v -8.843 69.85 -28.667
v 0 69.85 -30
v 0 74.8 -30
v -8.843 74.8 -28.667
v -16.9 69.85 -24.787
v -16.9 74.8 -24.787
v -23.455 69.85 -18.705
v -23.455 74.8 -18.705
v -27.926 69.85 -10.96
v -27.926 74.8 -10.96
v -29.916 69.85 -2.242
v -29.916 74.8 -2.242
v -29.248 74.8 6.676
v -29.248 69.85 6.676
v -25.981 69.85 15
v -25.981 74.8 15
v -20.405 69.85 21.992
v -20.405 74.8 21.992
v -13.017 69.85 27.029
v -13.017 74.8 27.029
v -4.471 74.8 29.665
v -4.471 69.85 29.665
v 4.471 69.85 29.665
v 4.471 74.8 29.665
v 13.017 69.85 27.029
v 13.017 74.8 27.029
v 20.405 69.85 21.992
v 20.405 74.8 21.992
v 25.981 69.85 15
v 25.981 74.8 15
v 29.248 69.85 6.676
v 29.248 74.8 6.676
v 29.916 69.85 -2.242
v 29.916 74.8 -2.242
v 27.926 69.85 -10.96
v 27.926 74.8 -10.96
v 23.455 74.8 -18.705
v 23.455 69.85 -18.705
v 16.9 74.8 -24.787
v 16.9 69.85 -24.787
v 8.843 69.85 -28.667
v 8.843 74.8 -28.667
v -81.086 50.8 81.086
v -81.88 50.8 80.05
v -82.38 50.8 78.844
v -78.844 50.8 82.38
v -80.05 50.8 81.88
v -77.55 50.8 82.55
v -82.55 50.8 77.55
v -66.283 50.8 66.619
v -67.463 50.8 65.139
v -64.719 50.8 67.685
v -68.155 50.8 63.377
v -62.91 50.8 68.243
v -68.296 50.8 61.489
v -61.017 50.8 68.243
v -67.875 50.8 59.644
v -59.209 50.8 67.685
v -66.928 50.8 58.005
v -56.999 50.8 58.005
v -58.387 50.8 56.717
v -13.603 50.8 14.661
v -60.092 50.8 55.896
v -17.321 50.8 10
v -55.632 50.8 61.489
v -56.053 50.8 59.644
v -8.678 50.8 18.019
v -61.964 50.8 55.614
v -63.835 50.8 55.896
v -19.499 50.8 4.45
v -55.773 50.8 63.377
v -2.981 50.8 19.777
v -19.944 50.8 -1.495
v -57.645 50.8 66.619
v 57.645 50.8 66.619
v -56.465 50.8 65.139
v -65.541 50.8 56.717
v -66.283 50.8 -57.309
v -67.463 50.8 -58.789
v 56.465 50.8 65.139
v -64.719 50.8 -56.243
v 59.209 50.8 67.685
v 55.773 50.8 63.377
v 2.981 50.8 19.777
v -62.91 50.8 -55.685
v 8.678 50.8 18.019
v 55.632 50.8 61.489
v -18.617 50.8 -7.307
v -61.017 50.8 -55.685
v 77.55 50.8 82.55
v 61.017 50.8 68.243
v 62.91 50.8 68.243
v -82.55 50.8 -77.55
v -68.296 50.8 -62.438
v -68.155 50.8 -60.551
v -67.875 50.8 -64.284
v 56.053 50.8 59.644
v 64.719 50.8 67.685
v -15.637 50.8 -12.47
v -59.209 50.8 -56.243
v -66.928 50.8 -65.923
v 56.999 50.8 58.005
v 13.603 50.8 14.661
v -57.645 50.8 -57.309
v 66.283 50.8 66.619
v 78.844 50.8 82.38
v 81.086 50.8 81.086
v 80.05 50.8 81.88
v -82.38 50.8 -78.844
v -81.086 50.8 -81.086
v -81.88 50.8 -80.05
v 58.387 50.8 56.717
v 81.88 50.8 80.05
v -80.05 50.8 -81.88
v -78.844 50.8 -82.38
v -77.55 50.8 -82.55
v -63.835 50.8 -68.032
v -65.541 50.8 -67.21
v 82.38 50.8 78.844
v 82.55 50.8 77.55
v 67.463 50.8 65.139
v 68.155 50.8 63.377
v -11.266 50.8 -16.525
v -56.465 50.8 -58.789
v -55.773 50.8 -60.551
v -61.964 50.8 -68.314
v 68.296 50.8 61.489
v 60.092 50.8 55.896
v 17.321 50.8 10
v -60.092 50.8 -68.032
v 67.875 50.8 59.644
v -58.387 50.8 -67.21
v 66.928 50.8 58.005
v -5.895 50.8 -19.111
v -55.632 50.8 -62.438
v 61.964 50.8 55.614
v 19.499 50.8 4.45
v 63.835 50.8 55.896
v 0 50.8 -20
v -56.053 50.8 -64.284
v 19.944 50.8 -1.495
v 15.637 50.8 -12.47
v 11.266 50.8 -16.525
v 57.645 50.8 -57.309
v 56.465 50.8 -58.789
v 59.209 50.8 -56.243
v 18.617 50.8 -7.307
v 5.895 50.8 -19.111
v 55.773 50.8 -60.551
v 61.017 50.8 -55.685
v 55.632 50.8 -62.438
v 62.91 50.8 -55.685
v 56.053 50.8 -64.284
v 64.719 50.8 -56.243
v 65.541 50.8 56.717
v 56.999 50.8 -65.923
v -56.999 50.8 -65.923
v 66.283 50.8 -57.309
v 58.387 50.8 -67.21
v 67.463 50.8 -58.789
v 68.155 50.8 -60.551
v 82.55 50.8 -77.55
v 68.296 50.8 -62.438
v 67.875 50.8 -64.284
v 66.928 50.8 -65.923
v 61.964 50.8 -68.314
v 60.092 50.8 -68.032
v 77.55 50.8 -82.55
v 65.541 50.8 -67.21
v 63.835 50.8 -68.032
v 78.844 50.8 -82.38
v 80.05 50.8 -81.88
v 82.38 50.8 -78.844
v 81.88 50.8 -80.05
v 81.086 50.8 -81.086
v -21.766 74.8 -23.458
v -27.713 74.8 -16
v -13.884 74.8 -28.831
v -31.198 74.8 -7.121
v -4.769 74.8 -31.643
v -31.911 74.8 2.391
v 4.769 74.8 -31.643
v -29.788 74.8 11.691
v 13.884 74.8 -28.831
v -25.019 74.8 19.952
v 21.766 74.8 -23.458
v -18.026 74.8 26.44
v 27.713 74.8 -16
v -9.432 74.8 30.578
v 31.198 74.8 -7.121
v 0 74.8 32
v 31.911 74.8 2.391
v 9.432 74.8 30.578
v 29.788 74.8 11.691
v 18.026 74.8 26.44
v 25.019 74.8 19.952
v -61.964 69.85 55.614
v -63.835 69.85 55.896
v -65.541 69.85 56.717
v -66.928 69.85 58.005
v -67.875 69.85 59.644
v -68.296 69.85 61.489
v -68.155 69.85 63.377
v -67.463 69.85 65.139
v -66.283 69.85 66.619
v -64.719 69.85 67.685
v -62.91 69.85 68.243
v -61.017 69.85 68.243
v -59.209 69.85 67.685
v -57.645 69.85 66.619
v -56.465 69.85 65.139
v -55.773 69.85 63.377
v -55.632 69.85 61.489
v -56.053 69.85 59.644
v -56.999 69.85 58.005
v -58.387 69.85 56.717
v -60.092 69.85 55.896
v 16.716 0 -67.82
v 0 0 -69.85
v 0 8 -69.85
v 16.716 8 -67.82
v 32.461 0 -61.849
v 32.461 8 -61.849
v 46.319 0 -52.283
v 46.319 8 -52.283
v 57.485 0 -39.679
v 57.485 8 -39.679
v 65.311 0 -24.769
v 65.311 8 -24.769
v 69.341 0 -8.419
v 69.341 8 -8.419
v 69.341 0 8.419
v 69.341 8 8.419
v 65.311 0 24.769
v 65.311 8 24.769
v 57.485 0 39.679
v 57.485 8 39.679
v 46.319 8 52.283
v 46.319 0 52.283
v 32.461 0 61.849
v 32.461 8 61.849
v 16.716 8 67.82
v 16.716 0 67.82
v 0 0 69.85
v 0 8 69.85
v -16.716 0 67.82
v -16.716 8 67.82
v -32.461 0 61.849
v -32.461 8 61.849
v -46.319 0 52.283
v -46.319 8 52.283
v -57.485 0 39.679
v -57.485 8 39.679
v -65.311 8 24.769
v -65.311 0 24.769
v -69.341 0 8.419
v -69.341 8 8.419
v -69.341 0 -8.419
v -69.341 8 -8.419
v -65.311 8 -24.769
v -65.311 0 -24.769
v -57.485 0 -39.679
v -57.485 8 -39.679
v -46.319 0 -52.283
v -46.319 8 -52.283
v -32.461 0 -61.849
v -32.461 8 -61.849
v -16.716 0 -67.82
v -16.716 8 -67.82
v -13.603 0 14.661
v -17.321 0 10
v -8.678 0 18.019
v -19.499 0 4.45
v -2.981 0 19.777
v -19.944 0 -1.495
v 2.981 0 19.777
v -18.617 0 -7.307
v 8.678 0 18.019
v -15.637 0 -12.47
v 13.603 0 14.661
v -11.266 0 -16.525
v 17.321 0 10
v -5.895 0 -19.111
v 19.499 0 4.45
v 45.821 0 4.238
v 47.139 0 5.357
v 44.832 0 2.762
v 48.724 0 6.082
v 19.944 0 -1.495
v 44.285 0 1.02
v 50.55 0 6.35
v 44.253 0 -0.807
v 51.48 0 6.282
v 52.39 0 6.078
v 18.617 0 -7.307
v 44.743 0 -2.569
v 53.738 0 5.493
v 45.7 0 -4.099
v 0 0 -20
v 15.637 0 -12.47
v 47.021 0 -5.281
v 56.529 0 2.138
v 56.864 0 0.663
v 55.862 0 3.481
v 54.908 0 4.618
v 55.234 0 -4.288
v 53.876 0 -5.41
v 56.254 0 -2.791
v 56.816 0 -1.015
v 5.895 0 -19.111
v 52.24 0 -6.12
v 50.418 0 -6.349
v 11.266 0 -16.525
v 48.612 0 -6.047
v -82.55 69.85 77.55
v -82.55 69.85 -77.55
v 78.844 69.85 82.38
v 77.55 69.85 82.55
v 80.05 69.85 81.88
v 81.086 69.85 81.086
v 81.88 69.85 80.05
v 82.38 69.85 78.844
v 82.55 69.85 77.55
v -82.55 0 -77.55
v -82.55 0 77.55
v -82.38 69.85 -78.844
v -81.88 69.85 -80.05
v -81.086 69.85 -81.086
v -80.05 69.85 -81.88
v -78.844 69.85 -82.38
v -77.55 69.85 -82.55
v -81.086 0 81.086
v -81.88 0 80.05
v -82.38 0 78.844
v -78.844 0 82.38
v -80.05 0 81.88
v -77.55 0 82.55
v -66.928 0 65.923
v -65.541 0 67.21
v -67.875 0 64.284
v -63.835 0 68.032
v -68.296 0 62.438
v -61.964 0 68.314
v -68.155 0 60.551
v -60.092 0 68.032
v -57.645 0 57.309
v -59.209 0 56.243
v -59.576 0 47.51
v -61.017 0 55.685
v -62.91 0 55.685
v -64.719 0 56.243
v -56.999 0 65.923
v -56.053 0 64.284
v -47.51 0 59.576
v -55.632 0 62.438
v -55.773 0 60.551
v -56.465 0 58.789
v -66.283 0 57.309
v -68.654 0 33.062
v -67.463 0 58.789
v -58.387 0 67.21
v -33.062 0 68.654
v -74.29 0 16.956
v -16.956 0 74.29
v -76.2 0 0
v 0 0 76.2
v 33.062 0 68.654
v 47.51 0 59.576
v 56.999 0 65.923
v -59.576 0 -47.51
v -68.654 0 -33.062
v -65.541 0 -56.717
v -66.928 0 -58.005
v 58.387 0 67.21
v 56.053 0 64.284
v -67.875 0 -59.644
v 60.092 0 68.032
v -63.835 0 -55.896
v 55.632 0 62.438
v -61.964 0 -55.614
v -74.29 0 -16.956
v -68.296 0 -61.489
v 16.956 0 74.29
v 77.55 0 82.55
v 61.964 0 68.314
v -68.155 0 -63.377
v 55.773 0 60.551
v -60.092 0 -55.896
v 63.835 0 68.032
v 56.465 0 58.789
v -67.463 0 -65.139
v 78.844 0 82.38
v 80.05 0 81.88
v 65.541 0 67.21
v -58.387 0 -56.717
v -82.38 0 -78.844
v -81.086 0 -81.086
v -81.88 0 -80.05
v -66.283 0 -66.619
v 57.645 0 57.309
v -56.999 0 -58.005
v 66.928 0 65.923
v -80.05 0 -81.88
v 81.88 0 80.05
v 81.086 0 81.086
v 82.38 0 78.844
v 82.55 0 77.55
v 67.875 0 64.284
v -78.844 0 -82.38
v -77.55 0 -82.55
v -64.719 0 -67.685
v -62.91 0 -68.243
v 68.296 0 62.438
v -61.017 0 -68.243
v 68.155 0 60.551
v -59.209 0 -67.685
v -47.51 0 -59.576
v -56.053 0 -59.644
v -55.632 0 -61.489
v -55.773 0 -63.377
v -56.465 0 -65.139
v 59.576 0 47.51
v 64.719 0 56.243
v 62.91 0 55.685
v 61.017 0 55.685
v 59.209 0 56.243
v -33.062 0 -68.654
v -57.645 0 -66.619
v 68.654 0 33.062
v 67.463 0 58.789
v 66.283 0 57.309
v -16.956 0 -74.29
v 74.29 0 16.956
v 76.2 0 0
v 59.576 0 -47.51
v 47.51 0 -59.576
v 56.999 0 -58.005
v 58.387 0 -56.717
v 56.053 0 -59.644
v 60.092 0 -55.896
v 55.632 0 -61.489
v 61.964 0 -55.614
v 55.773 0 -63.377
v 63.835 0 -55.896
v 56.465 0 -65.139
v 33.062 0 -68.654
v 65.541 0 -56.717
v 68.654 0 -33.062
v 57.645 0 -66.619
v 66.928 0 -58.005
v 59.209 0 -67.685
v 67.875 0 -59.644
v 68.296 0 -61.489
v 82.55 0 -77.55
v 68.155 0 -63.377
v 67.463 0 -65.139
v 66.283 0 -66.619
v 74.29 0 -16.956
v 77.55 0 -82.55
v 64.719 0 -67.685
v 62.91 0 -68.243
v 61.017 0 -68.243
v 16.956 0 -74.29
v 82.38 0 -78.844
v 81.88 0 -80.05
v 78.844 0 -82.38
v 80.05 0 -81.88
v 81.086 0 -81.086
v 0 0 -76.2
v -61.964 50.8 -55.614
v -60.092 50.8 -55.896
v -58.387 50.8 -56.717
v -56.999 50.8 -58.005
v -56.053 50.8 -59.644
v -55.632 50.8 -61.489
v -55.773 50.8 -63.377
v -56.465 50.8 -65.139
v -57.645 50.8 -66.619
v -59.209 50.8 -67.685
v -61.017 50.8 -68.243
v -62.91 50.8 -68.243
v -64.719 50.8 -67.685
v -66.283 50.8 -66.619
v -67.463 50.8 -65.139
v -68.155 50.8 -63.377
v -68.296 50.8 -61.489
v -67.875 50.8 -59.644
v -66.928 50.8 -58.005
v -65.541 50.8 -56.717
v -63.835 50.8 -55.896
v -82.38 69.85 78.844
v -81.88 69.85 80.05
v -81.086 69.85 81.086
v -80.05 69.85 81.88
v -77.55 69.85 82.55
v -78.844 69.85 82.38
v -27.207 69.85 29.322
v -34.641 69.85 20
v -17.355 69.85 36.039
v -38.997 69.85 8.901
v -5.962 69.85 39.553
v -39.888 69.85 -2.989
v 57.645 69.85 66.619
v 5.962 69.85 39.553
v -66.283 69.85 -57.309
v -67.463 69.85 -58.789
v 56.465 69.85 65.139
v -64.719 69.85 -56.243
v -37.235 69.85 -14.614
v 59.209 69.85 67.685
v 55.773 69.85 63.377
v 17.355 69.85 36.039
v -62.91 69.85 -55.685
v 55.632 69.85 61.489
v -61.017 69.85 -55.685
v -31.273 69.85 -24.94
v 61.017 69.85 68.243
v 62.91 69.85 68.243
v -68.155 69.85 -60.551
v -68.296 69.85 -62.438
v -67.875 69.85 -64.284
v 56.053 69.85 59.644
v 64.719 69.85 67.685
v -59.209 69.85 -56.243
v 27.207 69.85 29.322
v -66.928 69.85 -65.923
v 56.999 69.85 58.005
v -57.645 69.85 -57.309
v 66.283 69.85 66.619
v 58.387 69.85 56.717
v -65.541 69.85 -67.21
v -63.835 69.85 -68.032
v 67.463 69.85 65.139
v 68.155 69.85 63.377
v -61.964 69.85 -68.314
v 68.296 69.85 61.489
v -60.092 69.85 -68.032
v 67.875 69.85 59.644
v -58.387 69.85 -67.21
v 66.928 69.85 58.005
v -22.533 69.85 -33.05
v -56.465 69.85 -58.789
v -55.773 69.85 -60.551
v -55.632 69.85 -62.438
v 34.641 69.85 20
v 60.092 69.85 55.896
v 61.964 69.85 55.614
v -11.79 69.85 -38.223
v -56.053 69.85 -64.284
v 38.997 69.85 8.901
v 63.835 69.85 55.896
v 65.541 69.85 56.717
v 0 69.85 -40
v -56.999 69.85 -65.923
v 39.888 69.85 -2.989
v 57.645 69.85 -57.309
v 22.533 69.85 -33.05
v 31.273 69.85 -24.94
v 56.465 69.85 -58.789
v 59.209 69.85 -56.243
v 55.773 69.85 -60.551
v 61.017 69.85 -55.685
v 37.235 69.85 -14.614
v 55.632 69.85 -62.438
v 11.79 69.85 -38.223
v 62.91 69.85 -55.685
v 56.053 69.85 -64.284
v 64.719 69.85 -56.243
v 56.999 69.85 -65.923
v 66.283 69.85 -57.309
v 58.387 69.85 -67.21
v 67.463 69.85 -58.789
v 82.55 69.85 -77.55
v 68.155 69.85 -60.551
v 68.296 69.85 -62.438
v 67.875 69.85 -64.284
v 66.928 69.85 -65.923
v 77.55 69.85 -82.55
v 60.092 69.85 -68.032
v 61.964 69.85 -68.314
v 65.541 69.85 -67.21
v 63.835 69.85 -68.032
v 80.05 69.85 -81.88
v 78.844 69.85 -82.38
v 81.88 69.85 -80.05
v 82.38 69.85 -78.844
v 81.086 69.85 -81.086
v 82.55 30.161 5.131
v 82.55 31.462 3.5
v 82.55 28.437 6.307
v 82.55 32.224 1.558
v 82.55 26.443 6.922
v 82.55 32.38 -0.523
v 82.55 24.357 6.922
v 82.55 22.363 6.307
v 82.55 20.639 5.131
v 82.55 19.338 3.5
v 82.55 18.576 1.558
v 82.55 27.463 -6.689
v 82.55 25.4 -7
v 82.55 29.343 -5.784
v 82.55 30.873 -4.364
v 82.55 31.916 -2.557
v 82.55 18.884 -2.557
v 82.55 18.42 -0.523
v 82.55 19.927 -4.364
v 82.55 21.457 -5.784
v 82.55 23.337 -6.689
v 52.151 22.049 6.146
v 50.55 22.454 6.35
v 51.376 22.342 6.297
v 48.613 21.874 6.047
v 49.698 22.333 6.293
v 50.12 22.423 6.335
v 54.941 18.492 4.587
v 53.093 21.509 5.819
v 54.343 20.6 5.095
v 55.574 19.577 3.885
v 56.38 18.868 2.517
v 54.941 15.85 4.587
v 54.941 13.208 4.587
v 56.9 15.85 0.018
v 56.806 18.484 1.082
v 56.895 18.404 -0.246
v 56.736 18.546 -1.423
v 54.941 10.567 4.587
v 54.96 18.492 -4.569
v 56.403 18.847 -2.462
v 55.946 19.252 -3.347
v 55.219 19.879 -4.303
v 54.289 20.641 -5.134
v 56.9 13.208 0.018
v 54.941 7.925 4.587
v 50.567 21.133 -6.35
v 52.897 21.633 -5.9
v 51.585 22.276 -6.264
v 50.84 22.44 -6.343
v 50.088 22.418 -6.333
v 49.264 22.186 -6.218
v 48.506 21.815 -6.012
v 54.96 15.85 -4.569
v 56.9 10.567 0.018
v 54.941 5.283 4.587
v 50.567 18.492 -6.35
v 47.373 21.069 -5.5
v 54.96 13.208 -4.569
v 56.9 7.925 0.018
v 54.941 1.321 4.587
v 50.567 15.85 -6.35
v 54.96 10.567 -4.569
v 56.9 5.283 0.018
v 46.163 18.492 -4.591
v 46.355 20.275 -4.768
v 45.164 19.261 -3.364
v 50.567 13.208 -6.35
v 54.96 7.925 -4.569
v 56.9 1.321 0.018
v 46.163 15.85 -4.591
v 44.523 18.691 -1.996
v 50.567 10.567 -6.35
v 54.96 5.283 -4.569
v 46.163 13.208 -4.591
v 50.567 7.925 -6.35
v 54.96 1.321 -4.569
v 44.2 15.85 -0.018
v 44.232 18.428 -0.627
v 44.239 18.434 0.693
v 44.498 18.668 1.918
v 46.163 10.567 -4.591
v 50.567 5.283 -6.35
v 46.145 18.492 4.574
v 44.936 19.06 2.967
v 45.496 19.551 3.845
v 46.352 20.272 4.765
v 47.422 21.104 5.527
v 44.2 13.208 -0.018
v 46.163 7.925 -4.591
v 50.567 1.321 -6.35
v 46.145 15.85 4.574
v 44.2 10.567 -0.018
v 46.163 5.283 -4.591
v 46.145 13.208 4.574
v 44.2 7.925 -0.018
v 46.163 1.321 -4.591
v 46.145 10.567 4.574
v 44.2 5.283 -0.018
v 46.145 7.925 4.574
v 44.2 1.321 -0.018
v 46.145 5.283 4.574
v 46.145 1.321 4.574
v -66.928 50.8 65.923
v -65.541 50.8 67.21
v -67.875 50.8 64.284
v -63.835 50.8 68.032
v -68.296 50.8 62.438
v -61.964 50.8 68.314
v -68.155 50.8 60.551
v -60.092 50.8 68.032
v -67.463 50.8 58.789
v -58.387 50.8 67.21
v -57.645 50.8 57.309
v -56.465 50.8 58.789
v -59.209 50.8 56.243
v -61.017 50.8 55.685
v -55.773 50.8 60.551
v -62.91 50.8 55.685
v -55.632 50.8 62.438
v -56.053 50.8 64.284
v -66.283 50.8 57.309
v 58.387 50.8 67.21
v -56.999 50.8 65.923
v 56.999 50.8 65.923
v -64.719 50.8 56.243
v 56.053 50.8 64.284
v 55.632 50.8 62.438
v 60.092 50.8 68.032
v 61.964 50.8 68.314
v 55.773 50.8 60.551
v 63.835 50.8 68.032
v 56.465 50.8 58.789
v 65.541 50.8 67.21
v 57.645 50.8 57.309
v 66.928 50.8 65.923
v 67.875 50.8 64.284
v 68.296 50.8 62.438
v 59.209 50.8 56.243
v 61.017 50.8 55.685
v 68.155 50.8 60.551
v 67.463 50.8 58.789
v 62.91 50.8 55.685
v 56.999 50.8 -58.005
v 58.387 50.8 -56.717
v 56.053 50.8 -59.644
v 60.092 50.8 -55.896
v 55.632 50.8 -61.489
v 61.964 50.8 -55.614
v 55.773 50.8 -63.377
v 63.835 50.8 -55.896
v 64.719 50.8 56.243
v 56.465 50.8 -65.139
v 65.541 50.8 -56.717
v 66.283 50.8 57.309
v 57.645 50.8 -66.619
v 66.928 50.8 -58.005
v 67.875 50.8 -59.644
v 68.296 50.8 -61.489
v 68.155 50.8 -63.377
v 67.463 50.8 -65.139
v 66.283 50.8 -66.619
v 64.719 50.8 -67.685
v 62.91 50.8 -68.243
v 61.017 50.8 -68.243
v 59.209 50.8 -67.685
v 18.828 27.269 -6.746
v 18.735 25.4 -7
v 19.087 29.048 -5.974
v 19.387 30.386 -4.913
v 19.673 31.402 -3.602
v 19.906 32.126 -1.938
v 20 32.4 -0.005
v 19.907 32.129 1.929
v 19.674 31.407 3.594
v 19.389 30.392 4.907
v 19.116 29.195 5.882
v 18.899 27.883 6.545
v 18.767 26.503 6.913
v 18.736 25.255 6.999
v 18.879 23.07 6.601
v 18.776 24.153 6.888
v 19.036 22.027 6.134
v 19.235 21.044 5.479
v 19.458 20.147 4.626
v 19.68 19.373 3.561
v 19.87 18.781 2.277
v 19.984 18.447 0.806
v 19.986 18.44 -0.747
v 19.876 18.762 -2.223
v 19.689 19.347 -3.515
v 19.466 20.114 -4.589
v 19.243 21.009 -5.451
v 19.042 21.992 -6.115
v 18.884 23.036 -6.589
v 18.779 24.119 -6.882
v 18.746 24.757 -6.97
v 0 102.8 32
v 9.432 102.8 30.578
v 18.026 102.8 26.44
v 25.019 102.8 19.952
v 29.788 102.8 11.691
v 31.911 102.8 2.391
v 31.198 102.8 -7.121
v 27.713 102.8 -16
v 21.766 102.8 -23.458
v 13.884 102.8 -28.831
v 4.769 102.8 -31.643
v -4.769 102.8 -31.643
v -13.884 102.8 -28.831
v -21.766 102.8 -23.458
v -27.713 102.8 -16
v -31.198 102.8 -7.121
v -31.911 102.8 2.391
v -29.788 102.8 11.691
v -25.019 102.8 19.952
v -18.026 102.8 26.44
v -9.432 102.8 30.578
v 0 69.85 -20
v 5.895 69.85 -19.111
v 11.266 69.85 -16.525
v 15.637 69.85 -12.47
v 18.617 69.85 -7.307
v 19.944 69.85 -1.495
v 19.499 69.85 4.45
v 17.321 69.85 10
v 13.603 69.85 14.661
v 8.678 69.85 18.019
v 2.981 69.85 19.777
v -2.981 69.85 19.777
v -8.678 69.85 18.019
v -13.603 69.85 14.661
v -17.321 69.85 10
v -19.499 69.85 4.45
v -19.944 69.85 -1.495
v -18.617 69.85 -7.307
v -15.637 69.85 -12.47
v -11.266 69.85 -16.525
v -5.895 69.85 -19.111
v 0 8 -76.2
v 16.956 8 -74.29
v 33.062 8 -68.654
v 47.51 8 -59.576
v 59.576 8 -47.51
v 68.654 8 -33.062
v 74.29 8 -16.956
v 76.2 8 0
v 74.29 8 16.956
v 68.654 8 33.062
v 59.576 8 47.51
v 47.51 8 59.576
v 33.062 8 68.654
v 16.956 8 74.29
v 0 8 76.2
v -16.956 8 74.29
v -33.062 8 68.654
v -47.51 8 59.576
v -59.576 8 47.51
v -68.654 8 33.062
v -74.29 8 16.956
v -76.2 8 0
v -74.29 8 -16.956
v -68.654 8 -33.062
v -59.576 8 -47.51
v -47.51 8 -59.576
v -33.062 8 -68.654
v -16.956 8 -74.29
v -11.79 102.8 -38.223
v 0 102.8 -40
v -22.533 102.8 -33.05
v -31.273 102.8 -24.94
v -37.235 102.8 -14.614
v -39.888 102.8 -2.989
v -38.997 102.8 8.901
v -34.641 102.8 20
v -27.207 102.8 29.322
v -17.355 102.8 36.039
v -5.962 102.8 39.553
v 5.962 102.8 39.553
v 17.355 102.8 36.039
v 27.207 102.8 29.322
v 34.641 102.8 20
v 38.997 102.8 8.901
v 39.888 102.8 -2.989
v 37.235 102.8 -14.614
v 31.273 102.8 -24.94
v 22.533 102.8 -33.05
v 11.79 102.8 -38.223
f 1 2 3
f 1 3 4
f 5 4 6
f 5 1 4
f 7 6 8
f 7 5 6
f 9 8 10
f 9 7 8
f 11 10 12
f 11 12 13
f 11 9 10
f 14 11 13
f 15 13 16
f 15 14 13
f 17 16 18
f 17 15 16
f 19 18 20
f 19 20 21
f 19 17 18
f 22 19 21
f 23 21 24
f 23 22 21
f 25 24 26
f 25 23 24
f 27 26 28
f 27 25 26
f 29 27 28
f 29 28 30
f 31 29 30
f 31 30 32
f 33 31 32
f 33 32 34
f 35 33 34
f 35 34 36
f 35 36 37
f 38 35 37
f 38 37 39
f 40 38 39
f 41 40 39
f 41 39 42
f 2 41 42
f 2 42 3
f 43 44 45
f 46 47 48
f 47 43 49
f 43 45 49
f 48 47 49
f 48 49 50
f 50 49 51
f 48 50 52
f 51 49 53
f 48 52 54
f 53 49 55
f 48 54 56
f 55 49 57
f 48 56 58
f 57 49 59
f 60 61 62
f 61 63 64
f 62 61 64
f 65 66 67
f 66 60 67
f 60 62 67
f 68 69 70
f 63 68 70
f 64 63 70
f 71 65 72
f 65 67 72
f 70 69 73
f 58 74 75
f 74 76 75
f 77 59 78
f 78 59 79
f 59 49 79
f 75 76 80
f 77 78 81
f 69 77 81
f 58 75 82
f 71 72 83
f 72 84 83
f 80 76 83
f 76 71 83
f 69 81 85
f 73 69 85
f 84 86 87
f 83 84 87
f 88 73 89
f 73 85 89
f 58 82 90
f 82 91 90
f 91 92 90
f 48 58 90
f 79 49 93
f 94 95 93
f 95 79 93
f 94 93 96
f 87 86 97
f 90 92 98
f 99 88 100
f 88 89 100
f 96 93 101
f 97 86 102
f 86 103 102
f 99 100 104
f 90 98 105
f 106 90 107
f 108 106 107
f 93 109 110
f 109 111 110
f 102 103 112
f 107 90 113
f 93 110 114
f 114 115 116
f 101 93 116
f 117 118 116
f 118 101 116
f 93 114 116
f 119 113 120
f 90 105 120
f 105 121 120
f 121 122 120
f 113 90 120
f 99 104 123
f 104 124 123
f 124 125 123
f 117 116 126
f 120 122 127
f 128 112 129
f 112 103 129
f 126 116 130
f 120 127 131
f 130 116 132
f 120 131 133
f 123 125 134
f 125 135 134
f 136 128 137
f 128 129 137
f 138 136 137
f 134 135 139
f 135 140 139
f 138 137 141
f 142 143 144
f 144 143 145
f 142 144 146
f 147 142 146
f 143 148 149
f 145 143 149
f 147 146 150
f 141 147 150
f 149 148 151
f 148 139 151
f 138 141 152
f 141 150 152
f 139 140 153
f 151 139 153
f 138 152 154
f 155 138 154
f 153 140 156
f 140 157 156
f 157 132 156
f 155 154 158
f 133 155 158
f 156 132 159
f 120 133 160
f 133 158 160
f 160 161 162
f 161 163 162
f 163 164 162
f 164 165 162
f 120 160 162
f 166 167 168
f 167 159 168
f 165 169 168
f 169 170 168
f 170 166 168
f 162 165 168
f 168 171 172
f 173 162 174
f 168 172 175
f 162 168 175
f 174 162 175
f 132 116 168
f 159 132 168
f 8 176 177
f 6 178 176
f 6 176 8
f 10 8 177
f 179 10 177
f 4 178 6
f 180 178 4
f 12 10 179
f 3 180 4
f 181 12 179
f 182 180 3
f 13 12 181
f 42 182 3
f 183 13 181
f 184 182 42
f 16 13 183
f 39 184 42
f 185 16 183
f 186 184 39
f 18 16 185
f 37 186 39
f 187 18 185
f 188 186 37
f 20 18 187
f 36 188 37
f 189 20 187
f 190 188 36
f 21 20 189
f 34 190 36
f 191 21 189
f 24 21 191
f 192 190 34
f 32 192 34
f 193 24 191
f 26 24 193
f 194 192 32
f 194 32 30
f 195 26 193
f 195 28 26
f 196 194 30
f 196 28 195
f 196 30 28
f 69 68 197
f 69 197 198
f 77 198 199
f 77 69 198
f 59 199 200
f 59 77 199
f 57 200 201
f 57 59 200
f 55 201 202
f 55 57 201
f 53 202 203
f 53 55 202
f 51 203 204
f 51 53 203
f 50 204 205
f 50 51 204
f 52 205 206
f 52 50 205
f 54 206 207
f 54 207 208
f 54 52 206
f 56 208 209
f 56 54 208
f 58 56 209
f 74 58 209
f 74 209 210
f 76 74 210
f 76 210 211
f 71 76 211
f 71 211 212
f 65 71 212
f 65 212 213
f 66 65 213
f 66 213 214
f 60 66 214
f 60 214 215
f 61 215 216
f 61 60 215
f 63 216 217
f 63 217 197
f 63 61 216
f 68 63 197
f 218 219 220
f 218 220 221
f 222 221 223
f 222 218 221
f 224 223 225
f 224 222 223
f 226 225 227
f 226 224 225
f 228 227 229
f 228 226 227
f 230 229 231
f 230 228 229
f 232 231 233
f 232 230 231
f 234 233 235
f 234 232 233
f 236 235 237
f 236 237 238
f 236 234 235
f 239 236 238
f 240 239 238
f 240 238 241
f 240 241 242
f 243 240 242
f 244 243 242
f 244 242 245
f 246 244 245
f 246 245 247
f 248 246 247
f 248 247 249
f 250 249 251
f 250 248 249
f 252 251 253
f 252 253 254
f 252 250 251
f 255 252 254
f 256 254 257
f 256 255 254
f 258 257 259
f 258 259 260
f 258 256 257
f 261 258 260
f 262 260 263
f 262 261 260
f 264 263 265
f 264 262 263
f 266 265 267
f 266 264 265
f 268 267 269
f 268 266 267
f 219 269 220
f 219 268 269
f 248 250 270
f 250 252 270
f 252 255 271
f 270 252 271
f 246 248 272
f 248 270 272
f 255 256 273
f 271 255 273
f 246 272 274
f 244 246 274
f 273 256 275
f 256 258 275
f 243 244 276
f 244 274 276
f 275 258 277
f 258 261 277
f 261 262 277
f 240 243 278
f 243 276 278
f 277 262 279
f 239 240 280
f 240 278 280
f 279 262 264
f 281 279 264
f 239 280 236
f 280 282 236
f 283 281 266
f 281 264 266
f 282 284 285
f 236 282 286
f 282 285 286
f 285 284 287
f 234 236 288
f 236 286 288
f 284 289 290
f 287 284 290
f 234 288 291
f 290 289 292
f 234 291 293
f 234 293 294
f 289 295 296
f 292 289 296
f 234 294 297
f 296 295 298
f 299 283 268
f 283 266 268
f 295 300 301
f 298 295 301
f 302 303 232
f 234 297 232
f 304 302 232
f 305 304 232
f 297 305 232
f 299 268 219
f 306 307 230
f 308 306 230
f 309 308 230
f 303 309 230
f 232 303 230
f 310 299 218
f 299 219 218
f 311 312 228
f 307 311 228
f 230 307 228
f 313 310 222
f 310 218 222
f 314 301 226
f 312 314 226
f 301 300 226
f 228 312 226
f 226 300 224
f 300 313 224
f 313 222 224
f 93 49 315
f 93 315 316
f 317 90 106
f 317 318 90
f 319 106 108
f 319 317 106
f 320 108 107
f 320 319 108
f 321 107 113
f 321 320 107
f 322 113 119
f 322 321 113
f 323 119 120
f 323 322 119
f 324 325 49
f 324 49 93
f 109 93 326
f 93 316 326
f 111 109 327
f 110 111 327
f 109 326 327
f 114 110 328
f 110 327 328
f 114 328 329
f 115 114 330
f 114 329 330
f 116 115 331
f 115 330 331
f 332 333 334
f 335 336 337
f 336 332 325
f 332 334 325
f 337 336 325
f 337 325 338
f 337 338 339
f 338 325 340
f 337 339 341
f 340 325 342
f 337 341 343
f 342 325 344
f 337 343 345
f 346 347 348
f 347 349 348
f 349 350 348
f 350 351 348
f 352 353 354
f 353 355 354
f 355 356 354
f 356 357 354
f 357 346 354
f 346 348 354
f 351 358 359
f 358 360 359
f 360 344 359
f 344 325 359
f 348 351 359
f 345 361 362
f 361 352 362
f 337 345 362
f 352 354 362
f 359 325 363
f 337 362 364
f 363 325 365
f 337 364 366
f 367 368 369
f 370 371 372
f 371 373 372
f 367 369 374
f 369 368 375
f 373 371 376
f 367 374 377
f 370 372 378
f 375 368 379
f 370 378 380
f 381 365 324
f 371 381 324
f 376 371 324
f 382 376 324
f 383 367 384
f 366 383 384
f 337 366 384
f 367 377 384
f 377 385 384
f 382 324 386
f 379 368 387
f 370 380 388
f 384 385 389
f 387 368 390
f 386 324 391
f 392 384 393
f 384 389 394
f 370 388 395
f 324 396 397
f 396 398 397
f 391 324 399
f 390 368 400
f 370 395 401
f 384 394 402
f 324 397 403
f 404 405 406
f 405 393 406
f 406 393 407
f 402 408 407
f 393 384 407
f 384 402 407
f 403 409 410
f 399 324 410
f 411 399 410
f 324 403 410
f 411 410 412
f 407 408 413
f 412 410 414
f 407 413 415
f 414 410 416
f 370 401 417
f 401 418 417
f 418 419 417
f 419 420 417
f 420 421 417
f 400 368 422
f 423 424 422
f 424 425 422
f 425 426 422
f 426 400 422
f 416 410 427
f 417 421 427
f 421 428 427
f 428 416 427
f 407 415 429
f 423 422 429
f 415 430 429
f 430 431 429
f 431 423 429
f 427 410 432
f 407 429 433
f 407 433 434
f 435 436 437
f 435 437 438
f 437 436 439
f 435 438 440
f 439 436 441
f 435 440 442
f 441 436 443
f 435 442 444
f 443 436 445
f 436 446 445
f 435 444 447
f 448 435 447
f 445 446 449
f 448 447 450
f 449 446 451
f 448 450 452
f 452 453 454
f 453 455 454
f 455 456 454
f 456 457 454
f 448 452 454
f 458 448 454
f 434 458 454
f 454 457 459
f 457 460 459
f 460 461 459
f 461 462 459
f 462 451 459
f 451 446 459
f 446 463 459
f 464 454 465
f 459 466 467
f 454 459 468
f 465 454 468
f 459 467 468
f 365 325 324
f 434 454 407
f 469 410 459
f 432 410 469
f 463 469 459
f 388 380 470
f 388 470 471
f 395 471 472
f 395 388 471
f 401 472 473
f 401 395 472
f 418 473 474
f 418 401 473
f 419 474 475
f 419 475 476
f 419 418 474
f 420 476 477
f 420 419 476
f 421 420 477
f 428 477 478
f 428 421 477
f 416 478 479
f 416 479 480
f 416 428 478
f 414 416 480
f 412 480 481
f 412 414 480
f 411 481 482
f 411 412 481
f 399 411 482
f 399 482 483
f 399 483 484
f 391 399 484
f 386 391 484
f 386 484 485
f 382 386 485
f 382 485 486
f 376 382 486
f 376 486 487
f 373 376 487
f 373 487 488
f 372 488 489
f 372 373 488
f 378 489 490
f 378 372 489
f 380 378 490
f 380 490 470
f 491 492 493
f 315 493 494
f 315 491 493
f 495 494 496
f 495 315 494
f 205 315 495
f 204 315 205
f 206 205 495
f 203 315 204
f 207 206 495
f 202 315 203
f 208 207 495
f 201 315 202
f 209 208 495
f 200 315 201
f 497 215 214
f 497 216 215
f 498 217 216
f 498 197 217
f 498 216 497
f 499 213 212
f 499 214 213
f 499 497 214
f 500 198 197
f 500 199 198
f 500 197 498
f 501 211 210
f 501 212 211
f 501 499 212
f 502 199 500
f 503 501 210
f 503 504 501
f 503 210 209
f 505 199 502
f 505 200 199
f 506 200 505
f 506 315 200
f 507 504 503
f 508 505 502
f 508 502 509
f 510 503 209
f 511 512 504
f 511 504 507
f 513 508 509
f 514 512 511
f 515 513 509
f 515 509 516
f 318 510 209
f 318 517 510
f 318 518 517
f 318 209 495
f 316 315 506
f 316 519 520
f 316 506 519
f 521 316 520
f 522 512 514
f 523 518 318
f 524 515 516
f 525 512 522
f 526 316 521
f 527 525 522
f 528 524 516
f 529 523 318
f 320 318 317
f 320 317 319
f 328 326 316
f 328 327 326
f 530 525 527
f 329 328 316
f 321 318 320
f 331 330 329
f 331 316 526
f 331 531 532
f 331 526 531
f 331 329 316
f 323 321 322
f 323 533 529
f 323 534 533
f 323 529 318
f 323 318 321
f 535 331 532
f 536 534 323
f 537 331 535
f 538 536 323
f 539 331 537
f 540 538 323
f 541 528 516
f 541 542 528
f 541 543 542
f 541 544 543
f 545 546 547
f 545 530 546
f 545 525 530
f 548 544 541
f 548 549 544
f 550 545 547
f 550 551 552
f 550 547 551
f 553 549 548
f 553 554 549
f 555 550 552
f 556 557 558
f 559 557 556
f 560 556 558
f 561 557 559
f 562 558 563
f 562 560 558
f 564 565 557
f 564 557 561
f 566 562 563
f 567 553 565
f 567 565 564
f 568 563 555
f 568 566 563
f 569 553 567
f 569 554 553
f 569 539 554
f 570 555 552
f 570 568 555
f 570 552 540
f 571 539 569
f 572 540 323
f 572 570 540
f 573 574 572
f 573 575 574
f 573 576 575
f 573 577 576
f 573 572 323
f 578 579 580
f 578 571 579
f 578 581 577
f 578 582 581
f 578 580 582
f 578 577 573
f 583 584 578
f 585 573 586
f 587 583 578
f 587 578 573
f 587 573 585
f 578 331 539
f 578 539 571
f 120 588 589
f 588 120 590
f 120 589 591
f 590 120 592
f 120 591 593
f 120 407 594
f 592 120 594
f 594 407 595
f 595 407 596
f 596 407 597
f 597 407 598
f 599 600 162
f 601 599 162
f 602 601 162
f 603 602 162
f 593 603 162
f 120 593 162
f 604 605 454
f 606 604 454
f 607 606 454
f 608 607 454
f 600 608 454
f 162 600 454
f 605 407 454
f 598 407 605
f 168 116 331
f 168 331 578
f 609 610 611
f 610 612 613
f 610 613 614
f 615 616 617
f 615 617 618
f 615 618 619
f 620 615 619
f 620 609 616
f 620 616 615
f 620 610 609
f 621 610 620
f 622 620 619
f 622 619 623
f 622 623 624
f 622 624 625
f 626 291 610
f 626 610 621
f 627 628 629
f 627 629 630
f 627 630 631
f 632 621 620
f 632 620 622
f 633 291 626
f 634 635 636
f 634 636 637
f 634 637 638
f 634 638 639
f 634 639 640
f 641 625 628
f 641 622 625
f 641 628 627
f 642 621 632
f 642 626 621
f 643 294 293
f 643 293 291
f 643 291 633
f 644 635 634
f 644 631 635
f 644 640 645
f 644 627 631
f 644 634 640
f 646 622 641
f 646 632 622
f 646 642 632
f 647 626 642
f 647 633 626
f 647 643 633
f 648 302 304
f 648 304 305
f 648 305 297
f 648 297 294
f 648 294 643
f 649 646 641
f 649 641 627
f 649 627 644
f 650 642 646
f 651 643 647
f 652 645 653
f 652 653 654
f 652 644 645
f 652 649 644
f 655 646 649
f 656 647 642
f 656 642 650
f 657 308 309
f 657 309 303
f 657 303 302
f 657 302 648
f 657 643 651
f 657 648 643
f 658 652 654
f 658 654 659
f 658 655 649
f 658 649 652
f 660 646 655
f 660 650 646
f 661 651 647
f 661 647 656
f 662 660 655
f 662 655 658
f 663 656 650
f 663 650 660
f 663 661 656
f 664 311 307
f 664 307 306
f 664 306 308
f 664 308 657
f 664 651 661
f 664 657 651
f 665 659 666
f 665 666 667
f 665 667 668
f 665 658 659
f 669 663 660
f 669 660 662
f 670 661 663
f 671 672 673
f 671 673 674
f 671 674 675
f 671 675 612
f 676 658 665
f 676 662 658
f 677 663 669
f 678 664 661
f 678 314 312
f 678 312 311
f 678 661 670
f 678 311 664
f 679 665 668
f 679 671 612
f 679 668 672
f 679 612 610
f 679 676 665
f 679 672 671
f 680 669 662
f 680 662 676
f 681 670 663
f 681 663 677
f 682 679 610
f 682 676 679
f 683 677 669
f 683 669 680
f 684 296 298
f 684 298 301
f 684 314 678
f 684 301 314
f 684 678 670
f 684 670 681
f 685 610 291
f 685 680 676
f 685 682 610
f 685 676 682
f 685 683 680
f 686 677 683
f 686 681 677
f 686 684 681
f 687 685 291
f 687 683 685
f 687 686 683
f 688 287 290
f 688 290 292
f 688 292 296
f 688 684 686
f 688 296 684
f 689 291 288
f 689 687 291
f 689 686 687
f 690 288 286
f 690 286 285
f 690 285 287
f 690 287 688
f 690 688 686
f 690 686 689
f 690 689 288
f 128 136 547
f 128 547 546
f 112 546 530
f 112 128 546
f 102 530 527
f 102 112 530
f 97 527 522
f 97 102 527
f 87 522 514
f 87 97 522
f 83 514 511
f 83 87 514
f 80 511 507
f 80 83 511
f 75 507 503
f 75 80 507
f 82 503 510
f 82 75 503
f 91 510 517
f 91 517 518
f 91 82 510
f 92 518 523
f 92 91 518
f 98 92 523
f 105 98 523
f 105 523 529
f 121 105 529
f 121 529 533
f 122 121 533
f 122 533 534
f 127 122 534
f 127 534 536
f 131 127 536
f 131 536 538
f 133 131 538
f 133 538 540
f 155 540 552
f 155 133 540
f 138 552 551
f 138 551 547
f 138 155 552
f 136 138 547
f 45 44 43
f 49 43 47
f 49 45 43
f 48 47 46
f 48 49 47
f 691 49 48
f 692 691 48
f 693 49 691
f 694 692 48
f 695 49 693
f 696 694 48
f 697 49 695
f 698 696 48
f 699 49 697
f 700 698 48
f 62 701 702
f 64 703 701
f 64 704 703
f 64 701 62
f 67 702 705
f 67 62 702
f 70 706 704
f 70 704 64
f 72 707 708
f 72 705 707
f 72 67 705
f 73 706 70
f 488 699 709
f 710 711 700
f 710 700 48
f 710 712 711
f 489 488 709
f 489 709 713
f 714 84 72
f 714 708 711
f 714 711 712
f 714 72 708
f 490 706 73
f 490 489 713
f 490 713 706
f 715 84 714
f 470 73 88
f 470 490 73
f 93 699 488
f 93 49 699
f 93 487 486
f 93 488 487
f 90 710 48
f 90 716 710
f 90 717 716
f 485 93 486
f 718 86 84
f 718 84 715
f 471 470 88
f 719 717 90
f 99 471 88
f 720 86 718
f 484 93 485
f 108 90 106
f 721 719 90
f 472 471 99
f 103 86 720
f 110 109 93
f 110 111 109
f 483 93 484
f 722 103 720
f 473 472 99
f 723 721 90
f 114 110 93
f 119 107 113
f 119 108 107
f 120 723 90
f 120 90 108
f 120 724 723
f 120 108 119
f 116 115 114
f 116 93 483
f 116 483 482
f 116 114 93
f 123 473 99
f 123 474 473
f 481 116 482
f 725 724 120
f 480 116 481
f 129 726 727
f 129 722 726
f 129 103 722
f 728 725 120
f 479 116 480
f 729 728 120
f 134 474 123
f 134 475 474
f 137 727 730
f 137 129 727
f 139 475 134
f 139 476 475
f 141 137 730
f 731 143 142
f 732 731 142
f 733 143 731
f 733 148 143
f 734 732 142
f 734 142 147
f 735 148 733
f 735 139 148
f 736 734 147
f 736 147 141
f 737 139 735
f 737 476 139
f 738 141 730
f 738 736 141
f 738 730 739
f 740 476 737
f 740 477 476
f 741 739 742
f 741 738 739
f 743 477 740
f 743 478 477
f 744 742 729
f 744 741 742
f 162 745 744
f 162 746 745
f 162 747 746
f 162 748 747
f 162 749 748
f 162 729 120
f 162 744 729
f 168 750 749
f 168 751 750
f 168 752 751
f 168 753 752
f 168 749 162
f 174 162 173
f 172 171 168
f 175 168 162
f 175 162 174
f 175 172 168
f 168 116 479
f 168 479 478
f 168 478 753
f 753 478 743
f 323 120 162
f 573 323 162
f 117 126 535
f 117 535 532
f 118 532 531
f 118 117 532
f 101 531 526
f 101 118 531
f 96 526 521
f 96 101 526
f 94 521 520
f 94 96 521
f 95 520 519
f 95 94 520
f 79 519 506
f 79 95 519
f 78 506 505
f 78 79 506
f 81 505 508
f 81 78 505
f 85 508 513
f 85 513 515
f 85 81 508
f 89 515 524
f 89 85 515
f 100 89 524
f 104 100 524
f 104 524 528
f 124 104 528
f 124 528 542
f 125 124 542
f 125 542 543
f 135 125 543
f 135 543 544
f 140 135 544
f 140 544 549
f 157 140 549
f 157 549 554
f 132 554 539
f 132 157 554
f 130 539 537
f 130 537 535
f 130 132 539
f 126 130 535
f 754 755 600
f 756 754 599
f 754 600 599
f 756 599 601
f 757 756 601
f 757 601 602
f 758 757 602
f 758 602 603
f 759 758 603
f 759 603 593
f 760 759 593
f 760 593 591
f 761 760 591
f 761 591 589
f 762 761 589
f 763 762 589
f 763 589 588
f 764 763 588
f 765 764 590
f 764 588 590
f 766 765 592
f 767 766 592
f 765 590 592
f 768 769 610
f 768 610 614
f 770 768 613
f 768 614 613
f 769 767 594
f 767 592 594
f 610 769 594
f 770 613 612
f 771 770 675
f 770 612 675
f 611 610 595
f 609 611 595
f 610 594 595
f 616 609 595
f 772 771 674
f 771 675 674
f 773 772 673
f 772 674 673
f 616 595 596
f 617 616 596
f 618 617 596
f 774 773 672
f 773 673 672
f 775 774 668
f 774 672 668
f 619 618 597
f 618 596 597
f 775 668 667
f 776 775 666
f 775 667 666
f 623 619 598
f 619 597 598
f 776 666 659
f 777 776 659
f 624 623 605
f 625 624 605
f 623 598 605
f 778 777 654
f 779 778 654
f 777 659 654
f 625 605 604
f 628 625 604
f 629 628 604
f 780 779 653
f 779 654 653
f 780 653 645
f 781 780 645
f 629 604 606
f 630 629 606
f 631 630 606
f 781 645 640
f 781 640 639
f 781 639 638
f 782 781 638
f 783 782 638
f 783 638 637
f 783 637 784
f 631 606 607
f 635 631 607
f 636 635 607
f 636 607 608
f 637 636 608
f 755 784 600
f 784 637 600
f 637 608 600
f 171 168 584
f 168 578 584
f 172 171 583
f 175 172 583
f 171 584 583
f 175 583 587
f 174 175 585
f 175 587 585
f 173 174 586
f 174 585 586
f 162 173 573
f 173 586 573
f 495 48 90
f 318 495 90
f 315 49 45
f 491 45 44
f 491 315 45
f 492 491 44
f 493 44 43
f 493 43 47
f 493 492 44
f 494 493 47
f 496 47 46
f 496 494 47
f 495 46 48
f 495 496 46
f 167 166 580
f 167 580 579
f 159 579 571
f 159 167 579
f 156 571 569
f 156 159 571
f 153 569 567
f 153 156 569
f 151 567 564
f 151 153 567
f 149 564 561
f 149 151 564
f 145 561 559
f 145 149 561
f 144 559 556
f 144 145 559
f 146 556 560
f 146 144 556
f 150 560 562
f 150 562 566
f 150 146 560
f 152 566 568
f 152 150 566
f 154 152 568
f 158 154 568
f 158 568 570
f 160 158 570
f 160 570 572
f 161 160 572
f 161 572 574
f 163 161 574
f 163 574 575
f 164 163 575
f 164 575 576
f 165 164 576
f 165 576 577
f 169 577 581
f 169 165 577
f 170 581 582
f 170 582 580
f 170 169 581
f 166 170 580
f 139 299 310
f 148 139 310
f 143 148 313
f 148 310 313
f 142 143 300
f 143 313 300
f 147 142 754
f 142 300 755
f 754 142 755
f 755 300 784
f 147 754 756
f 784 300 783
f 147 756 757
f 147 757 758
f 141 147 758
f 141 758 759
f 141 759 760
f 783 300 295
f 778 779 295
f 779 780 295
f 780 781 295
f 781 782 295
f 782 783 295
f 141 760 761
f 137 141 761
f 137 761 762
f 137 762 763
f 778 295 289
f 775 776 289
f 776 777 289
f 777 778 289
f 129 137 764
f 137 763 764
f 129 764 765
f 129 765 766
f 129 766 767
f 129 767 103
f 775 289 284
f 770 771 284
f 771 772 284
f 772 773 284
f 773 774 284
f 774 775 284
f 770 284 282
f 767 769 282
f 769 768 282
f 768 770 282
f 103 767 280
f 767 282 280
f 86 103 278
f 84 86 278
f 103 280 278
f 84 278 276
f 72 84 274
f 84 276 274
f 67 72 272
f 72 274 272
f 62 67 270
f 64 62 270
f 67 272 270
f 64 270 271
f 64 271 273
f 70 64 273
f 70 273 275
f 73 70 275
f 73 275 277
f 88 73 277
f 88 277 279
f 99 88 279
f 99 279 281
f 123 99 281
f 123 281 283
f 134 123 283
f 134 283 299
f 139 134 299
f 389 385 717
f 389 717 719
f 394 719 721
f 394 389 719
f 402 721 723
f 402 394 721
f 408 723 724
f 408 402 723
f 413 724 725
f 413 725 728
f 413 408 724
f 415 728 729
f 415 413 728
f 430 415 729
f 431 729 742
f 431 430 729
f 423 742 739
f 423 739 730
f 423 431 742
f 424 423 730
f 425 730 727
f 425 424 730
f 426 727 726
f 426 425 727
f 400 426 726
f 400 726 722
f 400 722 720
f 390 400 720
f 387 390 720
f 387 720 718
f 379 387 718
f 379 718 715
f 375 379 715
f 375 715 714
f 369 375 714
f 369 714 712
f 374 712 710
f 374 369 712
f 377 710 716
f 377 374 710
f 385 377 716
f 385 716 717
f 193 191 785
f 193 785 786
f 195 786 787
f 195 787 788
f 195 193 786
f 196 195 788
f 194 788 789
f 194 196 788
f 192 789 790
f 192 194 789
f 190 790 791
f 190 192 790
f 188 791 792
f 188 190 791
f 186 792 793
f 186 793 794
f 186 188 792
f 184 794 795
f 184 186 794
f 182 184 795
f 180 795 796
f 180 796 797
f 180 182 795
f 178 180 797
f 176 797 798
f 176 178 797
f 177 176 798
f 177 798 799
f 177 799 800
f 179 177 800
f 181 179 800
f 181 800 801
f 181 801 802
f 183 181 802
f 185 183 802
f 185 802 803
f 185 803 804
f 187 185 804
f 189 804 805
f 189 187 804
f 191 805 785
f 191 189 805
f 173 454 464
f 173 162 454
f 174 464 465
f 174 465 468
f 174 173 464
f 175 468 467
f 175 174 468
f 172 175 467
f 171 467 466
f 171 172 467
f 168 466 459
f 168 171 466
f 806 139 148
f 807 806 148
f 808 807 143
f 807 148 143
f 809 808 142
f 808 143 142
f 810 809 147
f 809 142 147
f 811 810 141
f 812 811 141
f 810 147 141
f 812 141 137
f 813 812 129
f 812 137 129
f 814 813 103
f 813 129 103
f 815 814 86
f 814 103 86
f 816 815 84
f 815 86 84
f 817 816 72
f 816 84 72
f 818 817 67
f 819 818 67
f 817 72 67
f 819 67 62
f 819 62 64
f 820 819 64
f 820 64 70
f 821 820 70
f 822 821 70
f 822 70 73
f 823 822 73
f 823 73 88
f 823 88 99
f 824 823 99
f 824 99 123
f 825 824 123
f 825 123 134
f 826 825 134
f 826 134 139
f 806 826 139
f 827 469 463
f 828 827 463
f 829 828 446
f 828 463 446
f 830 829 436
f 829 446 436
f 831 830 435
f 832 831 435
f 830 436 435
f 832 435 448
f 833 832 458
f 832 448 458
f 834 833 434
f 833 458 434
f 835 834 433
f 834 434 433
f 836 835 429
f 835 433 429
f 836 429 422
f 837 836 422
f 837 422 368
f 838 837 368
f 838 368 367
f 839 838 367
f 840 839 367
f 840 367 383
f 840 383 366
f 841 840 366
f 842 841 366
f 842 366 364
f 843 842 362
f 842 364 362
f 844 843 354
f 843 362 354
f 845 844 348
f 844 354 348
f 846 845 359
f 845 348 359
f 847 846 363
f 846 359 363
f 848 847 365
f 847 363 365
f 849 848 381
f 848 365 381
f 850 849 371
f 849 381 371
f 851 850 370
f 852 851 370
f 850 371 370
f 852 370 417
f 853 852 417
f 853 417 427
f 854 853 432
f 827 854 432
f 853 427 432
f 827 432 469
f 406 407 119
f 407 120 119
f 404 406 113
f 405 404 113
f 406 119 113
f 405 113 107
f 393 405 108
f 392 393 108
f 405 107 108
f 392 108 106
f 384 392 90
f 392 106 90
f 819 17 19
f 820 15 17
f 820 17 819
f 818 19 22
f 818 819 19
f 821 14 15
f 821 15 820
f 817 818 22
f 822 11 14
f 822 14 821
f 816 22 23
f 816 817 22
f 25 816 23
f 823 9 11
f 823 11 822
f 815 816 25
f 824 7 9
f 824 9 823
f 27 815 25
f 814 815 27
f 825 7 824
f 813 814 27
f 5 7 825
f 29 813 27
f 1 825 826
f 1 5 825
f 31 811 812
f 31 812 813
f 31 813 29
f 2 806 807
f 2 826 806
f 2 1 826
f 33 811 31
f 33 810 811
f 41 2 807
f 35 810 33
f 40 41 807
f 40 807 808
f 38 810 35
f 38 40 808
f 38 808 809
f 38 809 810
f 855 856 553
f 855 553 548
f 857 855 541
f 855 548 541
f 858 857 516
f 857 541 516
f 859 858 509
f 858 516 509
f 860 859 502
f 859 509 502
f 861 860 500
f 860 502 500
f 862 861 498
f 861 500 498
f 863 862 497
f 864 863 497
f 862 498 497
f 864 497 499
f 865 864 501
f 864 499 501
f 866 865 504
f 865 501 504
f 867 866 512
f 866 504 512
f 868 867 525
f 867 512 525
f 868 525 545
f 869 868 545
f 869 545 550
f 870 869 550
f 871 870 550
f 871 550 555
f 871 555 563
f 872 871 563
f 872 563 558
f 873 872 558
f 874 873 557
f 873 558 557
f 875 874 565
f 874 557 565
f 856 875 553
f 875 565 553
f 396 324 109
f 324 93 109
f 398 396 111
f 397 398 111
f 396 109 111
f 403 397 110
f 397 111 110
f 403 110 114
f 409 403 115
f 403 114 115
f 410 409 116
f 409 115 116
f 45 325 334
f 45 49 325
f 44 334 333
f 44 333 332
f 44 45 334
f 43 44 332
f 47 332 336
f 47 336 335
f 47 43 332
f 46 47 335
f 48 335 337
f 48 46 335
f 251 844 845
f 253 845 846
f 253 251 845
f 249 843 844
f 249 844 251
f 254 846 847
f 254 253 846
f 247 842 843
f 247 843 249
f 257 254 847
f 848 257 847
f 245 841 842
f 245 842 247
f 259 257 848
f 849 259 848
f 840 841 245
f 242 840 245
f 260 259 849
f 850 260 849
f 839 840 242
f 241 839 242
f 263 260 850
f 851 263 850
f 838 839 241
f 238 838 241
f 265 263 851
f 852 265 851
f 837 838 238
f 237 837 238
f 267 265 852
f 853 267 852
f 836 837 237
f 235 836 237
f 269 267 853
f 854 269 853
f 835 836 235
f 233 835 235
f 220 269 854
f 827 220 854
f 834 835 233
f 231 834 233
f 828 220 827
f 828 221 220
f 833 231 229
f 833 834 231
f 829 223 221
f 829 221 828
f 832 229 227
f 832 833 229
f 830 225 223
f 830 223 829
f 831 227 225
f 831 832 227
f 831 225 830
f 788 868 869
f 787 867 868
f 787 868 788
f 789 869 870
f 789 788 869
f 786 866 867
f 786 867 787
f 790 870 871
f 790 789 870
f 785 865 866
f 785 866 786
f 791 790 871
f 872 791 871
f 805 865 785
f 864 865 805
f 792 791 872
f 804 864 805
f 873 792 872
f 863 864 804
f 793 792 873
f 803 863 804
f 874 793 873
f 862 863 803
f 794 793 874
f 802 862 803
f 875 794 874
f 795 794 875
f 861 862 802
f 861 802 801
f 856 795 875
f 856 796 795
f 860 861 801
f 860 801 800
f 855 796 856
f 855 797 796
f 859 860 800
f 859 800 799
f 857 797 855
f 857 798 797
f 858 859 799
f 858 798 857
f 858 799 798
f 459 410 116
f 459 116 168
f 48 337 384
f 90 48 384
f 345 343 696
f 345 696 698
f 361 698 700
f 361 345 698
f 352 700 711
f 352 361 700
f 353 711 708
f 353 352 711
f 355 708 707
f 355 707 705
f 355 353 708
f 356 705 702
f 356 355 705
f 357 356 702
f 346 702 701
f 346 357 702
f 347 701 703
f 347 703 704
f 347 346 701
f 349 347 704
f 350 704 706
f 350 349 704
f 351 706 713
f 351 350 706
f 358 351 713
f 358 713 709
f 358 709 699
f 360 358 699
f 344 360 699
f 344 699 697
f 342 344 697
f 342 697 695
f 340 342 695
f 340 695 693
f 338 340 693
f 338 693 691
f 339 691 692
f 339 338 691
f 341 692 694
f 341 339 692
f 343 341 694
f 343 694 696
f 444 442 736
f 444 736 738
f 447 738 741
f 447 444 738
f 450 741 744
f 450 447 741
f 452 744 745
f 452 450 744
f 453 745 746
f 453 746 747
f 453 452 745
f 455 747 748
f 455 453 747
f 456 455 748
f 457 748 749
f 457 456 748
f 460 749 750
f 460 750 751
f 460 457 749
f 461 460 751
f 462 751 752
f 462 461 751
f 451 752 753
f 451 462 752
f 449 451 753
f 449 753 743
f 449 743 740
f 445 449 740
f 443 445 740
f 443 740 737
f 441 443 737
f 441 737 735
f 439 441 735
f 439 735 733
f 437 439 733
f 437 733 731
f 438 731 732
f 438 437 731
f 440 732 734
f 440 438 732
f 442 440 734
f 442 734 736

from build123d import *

# Parameters (mm, degrees)
SKETCH1_W           = 165.1
SKETCH1_H           = 165.1
SKETCH1_R           = 6.35
BOSS_EXTRUDE1_DEPTH = 50.8
SKETCH3_R           = 20
CUT_EXTRUDE1_DEPTH  = 200
SKETCH4_R           = 7
CUT_EXTRUDE2_DEPTH  = 74.83
CUT_EXTRUDE3_START  = -52
CUT_EXTRUDE3_DEPTH  = 23.654240545
FILLET1_R           = 5
SKETCH6_R           = 76.2
SKETCH6_R_2         = 69.85
CUT_EXTRUDE4_DEPTH  = 8
BOSS_EXTRUDE3_START = 50.8
SKETCH1_2_W         = 165.1
SKETCH1_2_H         = 165.1
SKETCH1_2_R         = 6.35
BOSS_EXTRUDE3_DEPTH = 19.05
FILLET2_R           = 5
BOSS_EXTRUDE4_START = 19.05
SKETCH7_R           = 40
SKETCH7_R_2         = 32
SKETCH7_R_3         = 30
BOSS_EXTRUDE4_DEPTH = 32.95
CUT_EXTRUDE5_START  = 24
SKETCH7_3_R         = 32
SKETCH7_3_R_2       = 30
CUT_EXTRUDE5_DEPTH  = 28
SKETCH3_2_R         = 20
CUT_EXTRUDE6_DEPTH  = 156.55335103


with BuildPart() as part:
    # Sketch1 → Boss-Extrude1 (new body)
    with BuildSketch(Plane(origin=(0, 0, 0), x_dir=(1, 0, 0), z_dir=(0, 1, 0))):
        Rectangle(SKETCH1_W, SKETCH1_H)
        with Locations(Location((-61.963767235, 61.963767235, 0), (0, 0, 270))):
            Circle(SKETCH1_R, mode=Mode.SUBTRACT)
        with Locations(Location((61.963767235, 61.963767235, 0), (0, 0, 270))):
            Circle(SKETCH1_R, mode=Mode.SUBTRACT)
        with Locations(Location((61.963767235, -61.963767235, 0), (0, 0, 270))):
            Circle(SKETCH1_R, mode=Mode.SUBTRACT)
        with Locations(Location((-61.963767235, -61.963767235, 0), (0, 0, 270))):
            Circle(SKETCH1_R, mode=Mode.SUBTRACT)
    extrude(amount=BOSS_EXTRUDE1_DEPTH)

    # Sketch3 → Cut-Extrude1 (cut)
    with BuildSketch(Plane.XZ):
        with Locations(Location((0, 0, 0), (0, 0, 270))):
            Circle(SKETCH3_R)
    extrude(amount=-CUT_EXTRUDE1_DEPTH, mode=Mode.SUBTRACT)

    # Sketch4 → Cut-Extrude2 (cut)
    with BuildSketch(Plane(origin=(82.55, 0, 0), x_dir=(0, 0, -1), z_dir=(1, 0, 0))):
        with Locations((0, 25.4)):
            Circle(SKETCH4_R)
    extrude(amount=-CUT_EXTRUDE2_DEPTH, mode=Mode.SUBTRACT)

    # Cut-Extrude3: read off the stored shape, not the designer's step
    # Cut-Extrude3 outline → Cut-Extrude3 (cut)
    with BuildSketch(Plane(origin=(0, 50.8, 0), x_dir=(1, 0, 0), z_dir=(0, 1, 0)).offset(CUT_EXTRUDE3_START)):
        with BuildLine():
            add(Edge.make_bspline(
                [(50.55, -6.35), (51.47422126, -6.35), (52.302466674, -6.153856691), (53.750900163, -5.540336611), (54.377469866, -5.126654902), (55.505405632, -4.046735856), (55.989700628, -3.386313597), (56.692940175, -1.822566515), (56.897346558, -0.923572623), (56.902599966, 0.886717767), (56.699688489, 1.798962244), (56.004003016, 3.362853664), (55.518127515, 4.030235701), (54.400965604, 5.108341681), (53.760643664, 5.533511906), (52.329554982, 6.145011865), (51.480571337, 6.347463595), (50.110922006, 6.351232148), (49.655780423, 6.301077578), (48.823880157, 6.125660583), (48.443917363, 6.00347472), (47.356446167, 5.544626686), (46.727263651, 5.130170088), (45.598462304, 4.051448232), (45.112857079, 3.390908719), (44.407214336, 1.82399818), (44.202597079, 0.923991808), (44.197454079, -0.88794427), (44.40080252, -1.801200354), (45.098290108, -3.366869707), (45.585297177, -4.034583157), (46.704472395, -5.112538783), (47.346247575, -5.537622225), (48.779720786, -6.147796435), (49.62577874, -6.35), (50.55, -6.35)],
                knots=[0, 0, 0, 0, 0.0625, 0.0625, 0.125, 0.125, 0.1875, 0.1875, 0.25, 0.25, 0.3125, 0.3125, 0.375, 0.375, 0.4375, 0.4375, 0.5, 0.5, 0.53125, 0.53125, 0.5625, 0.5625, 0.625, 0.625, 0.6875, 0.6875, 0.75, 0.75, 0.8125, 0.8125, 0.875, 0.875, 0.9375, 0.9375, 1, 1, 1, 1], degree=3))
        make_face()
    extrude(amount=CUT_EXTRUDE3_DEPTH, mode=Mode.SUBTRACT)

    # Fillet1
    fillet1_edges = [part.edges().sort_by_distance(p)[0] for p in [
        (82.55, 25.4, 82.55),
        (-82.55, 25.4, 82.55),
        (-82.55, 25.4, -82.55),
        (82.55, 25.4, -82.55),
    ]]
    fillet(fillet1_edges, radius=FILLET1_R)

    # Sketch6 → Cut-Extrude4 (cut)
    with BuildSketch(Plane.XZ):
        with Locations(Location((0, 0, 0), (0, 0, 270))):
            Circle(SKETCH6_R)
        with Locations(Location((0, 0, 0), (0, 0, 270))):
            Circle(SKETCH6_R_2, mode=Mode.SUBTRACT)
    extrude(amount=-CUT_EXTRUDE4_DEPTH, mode=Mode.SUBTRACT)


with BuildPart() as body_2:
    # Sketch1<2> → Boss-Extrude3 (new body)
    with BuildSketch(Plane(origin=(0, 0, 0), x_dir=(1, 0, 0), z_dir=(0, 1, 0)).offset(BOSS_EXTRUDE3_START)):
        Rectangle(SKETCH1_2_W, SKETCH1_2_H)
        with Locations(Location((-61.963767235, 61.963767235, 0), (0, 0, 90))):
            Circle(SKETCH1_2_R, mode=Mode.SUBTRACT)
        with Locations(Location((61.963767235, 61.963767235, 0), (0, 0, 90))):
            Circle(SKETCH1_2_R, mode=Mode.SUBTRACT)
        with Locations(Location((61.963767235, -61.963767235, 0), (0, 0, 90))):
            Circle(SKETCH1_2_R, mode=Mode.SUBTRACT)
        with Locations(Location((-61.963767235, -61.963767235, 0), (0, 0, 90))):
            Circle(SKETCH1_2_R, mode=Mode.SUBTRACT)
    extrude(amount=BOSS_EXTRUDE3_DEPTH)

    # Fillet2
    fillet2_edges = [body_2.edges().sort_by_distance(p)[0] for p in [
        (-82.55, 60.325, 82.55),
        (82.55, 60.325, 82.55),
        (82.55, 60.325, -82.55),
        (-82.55, 60.325, -82.55),
    ]]
    fillet(fillet2_edges, radius=FILLET2_R)

    # Sketch7 → Boss-Extrude4 (add)
    # profile 1 of 2: a face of its own
    with BuildSketch(Plane(origin=(0, 50.8, 0), x_dir=(1, 0, 0), z_dir=(0, 1, 0)).offset(BOSS_EXTRUDE4_START)):
        with Locations(Location((0, 0, 0), (0, 0, 90))):
            Circle(SKETCH7_R)
        Circle(SKETCH7_R_2, mode=Mode.SUBTRACT)
    # profile 2 of 2: a face of its own
    with BuildSketch(Plane(origin=(0, 50.8, 0), x_dir=(1, 0, 0), z_dir=(0, 1, 0)).offset(BOSS_EXTRUDE4_START)):
        Circle(SKETCH7_R_2)
        with Locations(Location((0, 0, 0), (0, 0, 90))):
            Circle(SKETCH7_R_3, mode=Mode.SUBTRACT)
    extrude(amount=BOSS_EXTRUDE4_DEPTH)

    # Sketch7<3> → Cut-Extrude5 (cut)
    with BuildSketch(Plane(origin=(0, 50.8, 0), x_dir=(1, 0, 0), z_dir=(0, 1, 0)).offset(CUT_EXTRUDE5_START)):
        with Locations(Location((0, 0, 0), (0, 0, 270))):
            Circle(SKETCH7_3_R)
        with Locations(Location((0, 0, 0), (0, 0, 90))):
            Circle(SKETCH7_3_R_2, mode=Mode.SUBTRACT)
    extrude(amount=CUT_EXTRUDE5_DEPTH, mode=Mode.SUBTRACT)

    # Sketch3<2> → Cut-Extrude6 (cut, through all)
    with BuildSketch(Plane.XZ):
        with Locations(Location((0, 0, 0), (0, 0, 270))):
            Circle(SKETCH3_2_R)
    extrude(amount=-CUT_EXTRUDE6_DEPTH, mode=Mode.SUBTRACT)


solid = Compound([part.part, body_2.part])
